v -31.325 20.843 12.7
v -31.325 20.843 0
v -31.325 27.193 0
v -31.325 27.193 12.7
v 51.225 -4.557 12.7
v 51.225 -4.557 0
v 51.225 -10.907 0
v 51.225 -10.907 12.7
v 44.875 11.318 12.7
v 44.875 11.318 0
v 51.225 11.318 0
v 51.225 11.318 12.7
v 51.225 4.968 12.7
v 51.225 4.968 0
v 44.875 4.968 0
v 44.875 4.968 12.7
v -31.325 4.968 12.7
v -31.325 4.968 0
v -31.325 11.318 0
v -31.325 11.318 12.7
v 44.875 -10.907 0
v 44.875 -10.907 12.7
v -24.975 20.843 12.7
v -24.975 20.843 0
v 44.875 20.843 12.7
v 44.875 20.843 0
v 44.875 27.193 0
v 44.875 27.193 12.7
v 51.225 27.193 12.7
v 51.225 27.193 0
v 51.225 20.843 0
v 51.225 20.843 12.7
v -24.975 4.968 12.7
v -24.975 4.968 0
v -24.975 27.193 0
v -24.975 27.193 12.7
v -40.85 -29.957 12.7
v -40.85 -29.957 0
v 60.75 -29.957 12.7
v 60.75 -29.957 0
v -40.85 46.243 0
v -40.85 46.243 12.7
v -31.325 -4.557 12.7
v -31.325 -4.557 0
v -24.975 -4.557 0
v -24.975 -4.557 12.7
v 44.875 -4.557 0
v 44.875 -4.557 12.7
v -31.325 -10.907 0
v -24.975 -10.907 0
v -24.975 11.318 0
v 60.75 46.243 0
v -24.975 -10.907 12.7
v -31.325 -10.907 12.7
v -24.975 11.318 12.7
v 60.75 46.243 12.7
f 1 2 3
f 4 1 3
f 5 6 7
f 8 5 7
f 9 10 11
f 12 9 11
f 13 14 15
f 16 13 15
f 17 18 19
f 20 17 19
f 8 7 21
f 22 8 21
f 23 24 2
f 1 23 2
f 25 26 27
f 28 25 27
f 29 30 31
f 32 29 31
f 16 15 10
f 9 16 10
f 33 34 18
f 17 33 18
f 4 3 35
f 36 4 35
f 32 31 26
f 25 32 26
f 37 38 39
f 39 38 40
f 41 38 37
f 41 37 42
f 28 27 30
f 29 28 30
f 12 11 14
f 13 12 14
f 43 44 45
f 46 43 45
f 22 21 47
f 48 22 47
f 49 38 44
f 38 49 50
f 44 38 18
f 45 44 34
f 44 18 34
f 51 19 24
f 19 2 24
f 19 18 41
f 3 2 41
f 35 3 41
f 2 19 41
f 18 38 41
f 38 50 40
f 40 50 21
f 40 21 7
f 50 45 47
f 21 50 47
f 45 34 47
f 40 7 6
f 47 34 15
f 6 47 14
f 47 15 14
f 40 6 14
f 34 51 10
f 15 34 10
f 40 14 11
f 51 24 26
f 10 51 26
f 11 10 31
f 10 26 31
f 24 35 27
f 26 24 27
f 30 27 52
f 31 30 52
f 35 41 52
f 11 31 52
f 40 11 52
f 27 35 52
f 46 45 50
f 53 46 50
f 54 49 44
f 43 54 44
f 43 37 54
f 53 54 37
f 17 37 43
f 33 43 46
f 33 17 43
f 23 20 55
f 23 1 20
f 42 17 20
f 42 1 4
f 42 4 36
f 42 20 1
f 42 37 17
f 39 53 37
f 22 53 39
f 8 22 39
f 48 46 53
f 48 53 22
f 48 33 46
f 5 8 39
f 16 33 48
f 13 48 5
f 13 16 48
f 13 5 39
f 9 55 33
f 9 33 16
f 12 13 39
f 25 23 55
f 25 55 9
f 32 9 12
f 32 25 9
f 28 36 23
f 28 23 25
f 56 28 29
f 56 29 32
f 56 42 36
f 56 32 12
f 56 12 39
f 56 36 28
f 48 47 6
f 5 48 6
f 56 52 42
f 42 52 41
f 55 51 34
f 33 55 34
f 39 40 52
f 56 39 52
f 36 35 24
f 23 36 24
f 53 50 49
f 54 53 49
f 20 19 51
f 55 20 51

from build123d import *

# Parameters (mm, degrees)
F0_W     = 19.05
F0_H     = 76.2
F0_W_2   = 63.5
F1_DEPTH = 12.7


with BuildPart() as f1:
    # F0 (on Top) → F1 (new body)
    with BuildSketch(Plane.XY):
        with Locations((-31.324641, 8.143183)):
            Rectangle(F0_W, F0_H)
        Polygon((-31.324641, -4.556817), (-24.974641, -4.556817), (-24.974641, -7.731817), (-24.974641, -10.906817), (-31.324641, -10.906817), (-31.324641, -7.731817), align=None, mode=Mode.SUBTRACT)
        Polygon((-31.324641, 11.318183), (-24.974641, 11.318183), (-24.974641, 8.143183), (-24.974641, 4.968183), (-31.324641, 4.968183), (-31.324641, 8.143183), align=None, mode=Mode.SUBTRACT)
        Polygon((-31.324641, 27.193183), (-24.974641, 27.193183), (-24.974641, 24.018183), (-24.974641, 20.843183), (-31.324641, 20.843183), (-31.324641, 24.018183), align=None, mode=Mode.SUBTRACT)
        with Locations((9.950359, 8.143183)):
            Rectangle(F0_W_2, F0_H)
        Polygon((48.050359, 46.243183), (41.700359, 46.243183), (41.700359, -29.956817), (48.050359, -29.956817), (48.050359, -10.906817), (44.875359, -10.906817), (44.875359, -7.731817), (44.875359, -4.556817), (48.050359, -4.556817), (48.050359, 4.968183), (44.875359, 4.968183), (44.875359, 8.143183), (44.875359, 11.318183), (48.050359, 11.318183), (48.050359, 20.843183), (44.875359, 20.843183), (44.875359, 24.018183), (44.875359, 27.193183), (48.050359, 27.193183), align=None)
        Polygon((60.750359, 46.243183), (48.050359, 46.243183), (48.050359, 27.193183), (51.225359, 27.193183), (51.225359, 24.018183), (51.225359, 20.843183), (48.050359, 20.843183), (48.050359, 11.318183), (51.225359, 11.318183), (51.225359, 8.143183), (51.225359, 4.968183), (48.050359, 4.968183), (48.050359, -4.556817), (51.225359, -4.556817), (51.225359, -7.731817), (51.225359, -10.906817), (48.050359, -10.906817), (48.050359, -29.956817), (60.750359, -29.956817), align=None)
    extrude(amount=F1_DEPTH)


solid = f1.part
